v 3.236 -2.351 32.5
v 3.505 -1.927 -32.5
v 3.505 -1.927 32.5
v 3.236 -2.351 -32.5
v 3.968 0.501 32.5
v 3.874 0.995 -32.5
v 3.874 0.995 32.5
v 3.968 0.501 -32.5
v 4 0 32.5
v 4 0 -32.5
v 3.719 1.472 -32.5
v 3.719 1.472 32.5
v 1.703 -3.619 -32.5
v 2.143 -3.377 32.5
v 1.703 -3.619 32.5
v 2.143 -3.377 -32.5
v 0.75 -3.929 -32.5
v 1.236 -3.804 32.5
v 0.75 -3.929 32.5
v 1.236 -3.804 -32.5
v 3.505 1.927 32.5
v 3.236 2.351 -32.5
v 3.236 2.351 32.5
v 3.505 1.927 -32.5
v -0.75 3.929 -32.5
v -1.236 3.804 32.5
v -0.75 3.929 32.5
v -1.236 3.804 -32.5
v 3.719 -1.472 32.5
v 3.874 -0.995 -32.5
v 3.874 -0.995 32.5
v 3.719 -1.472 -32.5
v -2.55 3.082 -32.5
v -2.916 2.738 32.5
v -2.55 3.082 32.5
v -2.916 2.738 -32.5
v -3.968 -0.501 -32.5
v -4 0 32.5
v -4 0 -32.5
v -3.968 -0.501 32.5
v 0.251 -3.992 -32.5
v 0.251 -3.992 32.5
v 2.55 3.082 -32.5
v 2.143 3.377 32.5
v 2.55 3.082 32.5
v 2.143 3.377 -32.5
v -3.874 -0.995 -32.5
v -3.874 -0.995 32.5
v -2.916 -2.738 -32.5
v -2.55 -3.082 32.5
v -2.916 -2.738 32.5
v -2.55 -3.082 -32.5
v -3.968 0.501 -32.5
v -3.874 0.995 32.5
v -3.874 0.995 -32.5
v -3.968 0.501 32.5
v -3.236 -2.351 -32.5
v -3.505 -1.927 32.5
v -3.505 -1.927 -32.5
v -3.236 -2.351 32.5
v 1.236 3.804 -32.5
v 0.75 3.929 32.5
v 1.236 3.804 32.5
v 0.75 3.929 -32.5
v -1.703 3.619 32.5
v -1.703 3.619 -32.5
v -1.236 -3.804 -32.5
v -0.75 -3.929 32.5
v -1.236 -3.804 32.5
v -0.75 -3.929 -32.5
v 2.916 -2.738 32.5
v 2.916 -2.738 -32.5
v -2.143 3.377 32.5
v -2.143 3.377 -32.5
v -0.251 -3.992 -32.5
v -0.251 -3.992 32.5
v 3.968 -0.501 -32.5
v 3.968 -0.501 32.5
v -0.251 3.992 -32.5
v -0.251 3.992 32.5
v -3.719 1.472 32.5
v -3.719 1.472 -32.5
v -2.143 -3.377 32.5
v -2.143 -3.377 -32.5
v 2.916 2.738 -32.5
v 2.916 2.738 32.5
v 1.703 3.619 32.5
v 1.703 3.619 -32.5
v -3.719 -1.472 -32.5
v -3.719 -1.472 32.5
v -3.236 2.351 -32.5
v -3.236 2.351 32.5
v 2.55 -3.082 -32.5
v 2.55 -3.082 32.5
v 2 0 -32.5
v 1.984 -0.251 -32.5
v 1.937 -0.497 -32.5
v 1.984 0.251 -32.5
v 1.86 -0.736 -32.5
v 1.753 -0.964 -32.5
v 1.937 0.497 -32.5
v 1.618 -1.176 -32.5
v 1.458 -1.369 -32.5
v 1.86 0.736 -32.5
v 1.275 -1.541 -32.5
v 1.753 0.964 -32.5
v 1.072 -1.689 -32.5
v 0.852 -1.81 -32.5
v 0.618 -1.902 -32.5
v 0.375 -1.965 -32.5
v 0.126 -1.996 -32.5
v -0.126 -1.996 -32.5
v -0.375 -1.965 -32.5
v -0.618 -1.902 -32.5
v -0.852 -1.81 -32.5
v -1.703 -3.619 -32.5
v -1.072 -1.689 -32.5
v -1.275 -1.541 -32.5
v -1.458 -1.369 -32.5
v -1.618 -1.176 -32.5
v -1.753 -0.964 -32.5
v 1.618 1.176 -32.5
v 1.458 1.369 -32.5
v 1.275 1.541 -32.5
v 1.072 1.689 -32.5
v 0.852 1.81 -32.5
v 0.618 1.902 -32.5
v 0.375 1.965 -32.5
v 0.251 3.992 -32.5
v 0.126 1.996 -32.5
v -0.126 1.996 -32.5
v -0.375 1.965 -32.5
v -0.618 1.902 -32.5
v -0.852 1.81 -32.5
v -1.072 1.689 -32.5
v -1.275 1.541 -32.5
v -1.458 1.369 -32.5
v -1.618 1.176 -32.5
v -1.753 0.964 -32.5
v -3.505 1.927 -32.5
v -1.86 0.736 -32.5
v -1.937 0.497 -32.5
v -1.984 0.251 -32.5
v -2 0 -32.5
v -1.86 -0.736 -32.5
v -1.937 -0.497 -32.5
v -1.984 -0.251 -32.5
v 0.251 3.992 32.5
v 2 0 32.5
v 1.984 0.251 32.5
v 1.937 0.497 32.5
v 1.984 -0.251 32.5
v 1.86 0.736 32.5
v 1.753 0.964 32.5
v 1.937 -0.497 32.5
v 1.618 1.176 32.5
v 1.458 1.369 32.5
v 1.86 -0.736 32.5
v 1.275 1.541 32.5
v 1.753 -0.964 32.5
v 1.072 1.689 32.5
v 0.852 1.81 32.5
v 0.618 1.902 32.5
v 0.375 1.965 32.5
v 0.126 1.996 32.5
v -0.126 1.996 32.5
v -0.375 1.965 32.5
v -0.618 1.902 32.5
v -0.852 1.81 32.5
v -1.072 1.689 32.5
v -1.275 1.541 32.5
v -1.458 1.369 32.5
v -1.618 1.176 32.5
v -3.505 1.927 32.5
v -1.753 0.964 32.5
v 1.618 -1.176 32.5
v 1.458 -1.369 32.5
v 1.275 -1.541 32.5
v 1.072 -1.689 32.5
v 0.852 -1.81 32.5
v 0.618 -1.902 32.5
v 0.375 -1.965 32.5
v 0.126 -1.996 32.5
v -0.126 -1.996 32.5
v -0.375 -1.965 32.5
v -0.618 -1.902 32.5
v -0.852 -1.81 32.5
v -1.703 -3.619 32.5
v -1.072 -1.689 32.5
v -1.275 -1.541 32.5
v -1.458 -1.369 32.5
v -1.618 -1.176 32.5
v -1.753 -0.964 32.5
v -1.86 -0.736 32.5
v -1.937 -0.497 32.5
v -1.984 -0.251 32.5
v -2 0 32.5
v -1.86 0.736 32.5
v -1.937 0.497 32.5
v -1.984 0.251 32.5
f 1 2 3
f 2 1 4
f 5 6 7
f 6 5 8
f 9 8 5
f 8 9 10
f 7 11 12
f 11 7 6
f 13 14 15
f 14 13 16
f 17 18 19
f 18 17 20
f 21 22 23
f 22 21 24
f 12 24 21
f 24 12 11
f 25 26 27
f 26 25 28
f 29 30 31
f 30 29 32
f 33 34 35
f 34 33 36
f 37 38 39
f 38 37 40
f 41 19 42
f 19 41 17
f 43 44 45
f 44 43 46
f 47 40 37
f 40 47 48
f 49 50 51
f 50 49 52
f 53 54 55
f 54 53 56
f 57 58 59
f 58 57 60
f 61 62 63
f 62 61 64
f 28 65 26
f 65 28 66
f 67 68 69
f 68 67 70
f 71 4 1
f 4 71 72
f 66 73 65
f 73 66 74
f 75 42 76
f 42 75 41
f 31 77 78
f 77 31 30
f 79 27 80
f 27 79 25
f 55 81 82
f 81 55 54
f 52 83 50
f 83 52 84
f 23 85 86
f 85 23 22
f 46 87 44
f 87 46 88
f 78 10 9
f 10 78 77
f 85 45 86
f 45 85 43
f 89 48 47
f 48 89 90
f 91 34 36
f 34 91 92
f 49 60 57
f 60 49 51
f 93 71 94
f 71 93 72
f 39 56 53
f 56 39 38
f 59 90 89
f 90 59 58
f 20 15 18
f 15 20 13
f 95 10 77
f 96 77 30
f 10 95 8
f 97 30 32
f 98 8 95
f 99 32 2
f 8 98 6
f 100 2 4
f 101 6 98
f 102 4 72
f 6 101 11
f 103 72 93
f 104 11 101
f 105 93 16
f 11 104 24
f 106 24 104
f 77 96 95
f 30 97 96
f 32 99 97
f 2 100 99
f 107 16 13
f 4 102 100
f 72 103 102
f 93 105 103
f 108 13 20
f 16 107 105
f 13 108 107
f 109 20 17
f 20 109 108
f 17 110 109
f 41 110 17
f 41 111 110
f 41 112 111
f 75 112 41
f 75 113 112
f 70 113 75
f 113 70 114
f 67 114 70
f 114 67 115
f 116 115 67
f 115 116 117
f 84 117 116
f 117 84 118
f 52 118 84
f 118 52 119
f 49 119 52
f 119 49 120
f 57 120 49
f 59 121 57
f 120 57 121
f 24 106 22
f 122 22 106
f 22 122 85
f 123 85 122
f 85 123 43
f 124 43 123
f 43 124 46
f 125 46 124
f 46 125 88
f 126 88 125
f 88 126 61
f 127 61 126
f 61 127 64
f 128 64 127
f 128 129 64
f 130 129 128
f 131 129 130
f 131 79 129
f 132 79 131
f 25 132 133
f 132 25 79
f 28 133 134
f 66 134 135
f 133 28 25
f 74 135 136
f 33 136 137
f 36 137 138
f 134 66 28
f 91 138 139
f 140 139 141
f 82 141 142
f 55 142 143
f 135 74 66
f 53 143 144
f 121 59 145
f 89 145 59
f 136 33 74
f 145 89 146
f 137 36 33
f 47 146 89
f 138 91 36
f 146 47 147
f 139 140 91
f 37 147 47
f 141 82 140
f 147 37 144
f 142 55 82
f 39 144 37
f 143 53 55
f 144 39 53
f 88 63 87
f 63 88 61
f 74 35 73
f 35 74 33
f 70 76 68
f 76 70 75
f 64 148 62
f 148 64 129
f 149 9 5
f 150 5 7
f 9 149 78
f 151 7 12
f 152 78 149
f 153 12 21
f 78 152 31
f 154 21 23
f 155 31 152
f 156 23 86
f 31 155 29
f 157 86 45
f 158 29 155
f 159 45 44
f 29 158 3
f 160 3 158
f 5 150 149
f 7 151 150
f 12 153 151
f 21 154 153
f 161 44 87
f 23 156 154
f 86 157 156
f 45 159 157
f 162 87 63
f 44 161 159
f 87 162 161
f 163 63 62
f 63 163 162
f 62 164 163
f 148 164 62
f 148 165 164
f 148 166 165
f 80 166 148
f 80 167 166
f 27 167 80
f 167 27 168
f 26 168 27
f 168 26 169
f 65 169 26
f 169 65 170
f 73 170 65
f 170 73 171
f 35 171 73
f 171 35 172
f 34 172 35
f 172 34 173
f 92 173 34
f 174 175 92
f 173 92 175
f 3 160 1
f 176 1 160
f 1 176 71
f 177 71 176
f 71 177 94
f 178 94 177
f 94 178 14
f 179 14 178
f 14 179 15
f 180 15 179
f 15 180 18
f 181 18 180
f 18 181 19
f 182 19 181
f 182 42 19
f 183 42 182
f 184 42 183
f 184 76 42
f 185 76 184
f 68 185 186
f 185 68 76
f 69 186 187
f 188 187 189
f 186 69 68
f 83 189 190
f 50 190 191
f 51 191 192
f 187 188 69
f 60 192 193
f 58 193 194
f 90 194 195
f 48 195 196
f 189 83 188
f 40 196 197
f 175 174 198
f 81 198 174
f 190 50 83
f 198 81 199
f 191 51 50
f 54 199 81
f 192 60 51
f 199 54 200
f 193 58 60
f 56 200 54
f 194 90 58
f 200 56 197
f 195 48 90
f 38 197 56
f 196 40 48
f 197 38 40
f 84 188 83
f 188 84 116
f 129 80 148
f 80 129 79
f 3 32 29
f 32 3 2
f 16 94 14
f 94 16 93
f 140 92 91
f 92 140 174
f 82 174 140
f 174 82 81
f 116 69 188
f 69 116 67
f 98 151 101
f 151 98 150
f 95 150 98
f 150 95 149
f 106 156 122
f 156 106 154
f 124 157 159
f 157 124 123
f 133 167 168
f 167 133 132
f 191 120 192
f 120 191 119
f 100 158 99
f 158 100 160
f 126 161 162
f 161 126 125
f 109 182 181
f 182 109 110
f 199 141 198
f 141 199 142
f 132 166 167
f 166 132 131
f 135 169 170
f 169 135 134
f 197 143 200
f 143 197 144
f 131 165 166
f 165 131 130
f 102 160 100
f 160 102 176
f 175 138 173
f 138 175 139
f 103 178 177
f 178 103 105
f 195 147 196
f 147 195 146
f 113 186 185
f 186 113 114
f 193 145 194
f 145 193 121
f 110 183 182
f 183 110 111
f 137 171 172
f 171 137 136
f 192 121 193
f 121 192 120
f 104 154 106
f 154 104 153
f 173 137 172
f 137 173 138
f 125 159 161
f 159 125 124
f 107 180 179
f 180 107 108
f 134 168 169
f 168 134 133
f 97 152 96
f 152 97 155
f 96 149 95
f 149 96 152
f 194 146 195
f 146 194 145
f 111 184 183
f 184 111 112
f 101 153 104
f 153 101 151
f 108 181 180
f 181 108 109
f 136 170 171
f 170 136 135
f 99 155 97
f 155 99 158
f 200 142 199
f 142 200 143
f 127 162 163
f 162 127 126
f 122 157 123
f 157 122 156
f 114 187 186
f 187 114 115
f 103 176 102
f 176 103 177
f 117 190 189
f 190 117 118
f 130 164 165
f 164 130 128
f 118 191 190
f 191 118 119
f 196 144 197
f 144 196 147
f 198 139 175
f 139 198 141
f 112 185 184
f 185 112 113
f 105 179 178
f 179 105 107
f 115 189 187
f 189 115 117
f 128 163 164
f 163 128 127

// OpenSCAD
$fn = 50;


difference() {
	union() {
		translate(v = [0, 0, -32.5000000000]) {
			cylinder(h = 65, r = 4.0000000000);
		}
	}
	union() {
		translate(v = [0, 0, -100.0000000000]) {
			cylinder(h = 200, r = 2.0000000000);
		}
	}
}
